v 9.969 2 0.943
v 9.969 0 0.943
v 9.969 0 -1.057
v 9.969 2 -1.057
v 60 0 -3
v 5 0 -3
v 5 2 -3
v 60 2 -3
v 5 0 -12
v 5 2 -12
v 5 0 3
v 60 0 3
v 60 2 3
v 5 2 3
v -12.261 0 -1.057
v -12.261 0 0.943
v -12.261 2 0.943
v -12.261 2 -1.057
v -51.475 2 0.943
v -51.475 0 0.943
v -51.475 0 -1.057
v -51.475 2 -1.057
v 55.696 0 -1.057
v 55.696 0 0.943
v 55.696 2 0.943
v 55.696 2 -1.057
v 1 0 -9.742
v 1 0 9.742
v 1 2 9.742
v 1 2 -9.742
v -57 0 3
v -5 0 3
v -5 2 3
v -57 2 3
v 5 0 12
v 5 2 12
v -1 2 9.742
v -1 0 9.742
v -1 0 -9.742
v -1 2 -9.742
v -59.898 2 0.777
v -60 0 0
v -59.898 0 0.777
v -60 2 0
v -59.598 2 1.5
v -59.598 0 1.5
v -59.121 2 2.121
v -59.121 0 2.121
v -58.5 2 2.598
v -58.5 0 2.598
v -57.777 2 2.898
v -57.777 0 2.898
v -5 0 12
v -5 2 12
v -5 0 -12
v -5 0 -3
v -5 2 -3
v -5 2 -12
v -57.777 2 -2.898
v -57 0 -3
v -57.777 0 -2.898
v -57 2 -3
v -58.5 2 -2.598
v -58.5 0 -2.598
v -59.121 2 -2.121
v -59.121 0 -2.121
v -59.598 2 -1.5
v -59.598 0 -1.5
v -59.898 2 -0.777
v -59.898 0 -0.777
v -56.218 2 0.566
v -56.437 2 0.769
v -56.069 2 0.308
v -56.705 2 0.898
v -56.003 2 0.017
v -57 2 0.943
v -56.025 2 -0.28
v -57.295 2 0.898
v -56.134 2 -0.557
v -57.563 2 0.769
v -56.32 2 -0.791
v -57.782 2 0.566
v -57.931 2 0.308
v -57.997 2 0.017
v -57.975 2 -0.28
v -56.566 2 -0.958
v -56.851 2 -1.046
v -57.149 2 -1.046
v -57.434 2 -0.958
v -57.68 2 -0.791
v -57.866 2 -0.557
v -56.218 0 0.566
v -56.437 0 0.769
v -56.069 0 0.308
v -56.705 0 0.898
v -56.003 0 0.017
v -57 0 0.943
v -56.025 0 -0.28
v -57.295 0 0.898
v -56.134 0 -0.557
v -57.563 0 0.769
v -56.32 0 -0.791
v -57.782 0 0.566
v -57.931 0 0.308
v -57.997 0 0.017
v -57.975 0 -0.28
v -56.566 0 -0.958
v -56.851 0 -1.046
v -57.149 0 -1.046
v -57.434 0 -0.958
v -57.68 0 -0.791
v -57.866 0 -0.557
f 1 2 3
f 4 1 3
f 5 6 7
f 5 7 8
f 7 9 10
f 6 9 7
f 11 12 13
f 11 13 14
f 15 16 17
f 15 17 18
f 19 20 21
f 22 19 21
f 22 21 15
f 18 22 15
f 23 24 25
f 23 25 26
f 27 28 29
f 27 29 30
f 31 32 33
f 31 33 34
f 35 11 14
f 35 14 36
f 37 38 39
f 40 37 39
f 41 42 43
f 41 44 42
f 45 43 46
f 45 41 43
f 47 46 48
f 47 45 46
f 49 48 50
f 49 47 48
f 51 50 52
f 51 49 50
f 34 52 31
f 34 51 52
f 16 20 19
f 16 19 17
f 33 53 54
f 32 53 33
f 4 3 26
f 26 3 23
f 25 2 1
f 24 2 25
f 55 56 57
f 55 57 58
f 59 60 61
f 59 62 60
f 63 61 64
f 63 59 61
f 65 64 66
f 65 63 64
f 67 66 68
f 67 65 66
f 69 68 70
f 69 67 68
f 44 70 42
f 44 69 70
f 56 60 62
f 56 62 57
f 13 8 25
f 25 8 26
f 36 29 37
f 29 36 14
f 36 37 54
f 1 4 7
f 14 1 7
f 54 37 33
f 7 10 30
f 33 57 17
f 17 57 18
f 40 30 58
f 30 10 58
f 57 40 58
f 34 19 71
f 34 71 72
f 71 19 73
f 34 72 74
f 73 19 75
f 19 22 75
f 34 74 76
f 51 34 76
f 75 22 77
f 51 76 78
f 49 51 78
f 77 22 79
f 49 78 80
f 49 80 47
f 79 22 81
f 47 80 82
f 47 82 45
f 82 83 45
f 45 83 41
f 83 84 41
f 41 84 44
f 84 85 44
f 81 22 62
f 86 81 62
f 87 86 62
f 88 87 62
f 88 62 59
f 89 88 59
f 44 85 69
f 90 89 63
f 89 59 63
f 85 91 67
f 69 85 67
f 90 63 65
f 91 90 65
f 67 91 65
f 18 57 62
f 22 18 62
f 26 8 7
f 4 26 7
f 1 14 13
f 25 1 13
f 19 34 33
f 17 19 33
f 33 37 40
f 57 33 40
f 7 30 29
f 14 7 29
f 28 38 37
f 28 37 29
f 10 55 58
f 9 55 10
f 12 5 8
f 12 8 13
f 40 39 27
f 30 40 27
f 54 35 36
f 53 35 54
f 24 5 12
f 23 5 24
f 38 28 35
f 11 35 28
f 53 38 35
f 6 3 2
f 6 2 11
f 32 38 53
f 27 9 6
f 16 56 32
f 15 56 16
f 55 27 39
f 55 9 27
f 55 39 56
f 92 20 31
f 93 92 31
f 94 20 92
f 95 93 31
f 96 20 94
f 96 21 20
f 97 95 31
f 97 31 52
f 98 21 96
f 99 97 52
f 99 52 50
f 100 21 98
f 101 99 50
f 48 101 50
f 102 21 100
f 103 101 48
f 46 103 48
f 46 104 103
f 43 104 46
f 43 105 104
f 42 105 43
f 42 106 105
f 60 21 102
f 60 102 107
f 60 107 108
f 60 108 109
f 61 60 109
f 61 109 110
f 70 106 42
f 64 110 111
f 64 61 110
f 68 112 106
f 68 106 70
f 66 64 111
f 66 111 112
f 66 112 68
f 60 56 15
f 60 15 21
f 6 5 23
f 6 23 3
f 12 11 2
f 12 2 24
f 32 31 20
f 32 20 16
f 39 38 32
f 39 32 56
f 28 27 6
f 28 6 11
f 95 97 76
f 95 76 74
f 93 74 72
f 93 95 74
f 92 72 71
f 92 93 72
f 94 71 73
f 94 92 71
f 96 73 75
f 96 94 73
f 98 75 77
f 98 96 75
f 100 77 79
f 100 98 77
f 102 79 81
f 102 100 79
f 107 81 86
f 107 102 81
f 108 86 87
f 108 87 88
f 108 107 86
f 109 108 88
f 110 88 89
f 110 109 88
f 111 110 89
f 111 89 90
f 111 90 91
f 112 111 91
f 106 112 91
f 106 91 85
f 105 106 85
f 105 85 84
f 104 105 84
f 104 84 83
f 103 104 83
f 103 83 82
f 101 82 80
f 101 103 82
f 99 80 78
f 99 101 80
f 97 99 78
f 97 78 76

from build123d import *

# Parameters (mm, degrees)
SKETCH1_R           = 1
SKETCH1_W           = 39.213246084
SKETCH1_H           = 2
SKETCH1_W_2         = 45.726803631
SKETCH1_W_3         = 2
SKETCH1_H_2         = 19.484553002
BOSS_EXTRUDE1_DEPTH = 2
FILLET1_R           = 3


with BuildPart() as part:
    # Sketch1 → Boss-Extrude1 (new body)
    with BuildSketch(Plane(origin=(0, 0, 0), x_dir=(1, 0, 0), z_dir=(0, 1, 0))):
        Polygon((-5, 3), (-5, 12), (5, 12), (5, 3), (60, 3), (60, -3), (5, -3), (5, -12), (-5, -12), (-5, -3), (-60, -3), (-60, 3), align=None)
        with Locations(Location((-57, 0.057494984, 0), (0, 0, 270))):
            Circle(SKETCH1_R, mode=Mode.SUBTRACT)
        with Locations((-31.867954369, 0.057494984)):
            Rectangle(SKETCH1_W, SKETCH1_H, mode=Mode.SUBTRACT)
        with Locations((32.832738322, 0.057494984)):
            Rectangle(SKETCH1_W_2, SKETCH1_H, mode=Mode.SUBTRACT)
        Rectangle(SKETCH1_W_3, SKETCH1_H_2, mode=Mode.SUBTRACT)
    extrude(amount=BOSS_EXTRUDE1_DEPTH)

    # Fillet1
    fillet1_edges = [part.edges().sort_by_distance(p)[0] for p in [
        (-60, 1, 3),
        (-60, 1, -3),
    ]]
    fillet(fillet1_edges, radius=FILLET1_R - 0.0001)  # a hair under: the kernel refuses the full size


solid = part.part
